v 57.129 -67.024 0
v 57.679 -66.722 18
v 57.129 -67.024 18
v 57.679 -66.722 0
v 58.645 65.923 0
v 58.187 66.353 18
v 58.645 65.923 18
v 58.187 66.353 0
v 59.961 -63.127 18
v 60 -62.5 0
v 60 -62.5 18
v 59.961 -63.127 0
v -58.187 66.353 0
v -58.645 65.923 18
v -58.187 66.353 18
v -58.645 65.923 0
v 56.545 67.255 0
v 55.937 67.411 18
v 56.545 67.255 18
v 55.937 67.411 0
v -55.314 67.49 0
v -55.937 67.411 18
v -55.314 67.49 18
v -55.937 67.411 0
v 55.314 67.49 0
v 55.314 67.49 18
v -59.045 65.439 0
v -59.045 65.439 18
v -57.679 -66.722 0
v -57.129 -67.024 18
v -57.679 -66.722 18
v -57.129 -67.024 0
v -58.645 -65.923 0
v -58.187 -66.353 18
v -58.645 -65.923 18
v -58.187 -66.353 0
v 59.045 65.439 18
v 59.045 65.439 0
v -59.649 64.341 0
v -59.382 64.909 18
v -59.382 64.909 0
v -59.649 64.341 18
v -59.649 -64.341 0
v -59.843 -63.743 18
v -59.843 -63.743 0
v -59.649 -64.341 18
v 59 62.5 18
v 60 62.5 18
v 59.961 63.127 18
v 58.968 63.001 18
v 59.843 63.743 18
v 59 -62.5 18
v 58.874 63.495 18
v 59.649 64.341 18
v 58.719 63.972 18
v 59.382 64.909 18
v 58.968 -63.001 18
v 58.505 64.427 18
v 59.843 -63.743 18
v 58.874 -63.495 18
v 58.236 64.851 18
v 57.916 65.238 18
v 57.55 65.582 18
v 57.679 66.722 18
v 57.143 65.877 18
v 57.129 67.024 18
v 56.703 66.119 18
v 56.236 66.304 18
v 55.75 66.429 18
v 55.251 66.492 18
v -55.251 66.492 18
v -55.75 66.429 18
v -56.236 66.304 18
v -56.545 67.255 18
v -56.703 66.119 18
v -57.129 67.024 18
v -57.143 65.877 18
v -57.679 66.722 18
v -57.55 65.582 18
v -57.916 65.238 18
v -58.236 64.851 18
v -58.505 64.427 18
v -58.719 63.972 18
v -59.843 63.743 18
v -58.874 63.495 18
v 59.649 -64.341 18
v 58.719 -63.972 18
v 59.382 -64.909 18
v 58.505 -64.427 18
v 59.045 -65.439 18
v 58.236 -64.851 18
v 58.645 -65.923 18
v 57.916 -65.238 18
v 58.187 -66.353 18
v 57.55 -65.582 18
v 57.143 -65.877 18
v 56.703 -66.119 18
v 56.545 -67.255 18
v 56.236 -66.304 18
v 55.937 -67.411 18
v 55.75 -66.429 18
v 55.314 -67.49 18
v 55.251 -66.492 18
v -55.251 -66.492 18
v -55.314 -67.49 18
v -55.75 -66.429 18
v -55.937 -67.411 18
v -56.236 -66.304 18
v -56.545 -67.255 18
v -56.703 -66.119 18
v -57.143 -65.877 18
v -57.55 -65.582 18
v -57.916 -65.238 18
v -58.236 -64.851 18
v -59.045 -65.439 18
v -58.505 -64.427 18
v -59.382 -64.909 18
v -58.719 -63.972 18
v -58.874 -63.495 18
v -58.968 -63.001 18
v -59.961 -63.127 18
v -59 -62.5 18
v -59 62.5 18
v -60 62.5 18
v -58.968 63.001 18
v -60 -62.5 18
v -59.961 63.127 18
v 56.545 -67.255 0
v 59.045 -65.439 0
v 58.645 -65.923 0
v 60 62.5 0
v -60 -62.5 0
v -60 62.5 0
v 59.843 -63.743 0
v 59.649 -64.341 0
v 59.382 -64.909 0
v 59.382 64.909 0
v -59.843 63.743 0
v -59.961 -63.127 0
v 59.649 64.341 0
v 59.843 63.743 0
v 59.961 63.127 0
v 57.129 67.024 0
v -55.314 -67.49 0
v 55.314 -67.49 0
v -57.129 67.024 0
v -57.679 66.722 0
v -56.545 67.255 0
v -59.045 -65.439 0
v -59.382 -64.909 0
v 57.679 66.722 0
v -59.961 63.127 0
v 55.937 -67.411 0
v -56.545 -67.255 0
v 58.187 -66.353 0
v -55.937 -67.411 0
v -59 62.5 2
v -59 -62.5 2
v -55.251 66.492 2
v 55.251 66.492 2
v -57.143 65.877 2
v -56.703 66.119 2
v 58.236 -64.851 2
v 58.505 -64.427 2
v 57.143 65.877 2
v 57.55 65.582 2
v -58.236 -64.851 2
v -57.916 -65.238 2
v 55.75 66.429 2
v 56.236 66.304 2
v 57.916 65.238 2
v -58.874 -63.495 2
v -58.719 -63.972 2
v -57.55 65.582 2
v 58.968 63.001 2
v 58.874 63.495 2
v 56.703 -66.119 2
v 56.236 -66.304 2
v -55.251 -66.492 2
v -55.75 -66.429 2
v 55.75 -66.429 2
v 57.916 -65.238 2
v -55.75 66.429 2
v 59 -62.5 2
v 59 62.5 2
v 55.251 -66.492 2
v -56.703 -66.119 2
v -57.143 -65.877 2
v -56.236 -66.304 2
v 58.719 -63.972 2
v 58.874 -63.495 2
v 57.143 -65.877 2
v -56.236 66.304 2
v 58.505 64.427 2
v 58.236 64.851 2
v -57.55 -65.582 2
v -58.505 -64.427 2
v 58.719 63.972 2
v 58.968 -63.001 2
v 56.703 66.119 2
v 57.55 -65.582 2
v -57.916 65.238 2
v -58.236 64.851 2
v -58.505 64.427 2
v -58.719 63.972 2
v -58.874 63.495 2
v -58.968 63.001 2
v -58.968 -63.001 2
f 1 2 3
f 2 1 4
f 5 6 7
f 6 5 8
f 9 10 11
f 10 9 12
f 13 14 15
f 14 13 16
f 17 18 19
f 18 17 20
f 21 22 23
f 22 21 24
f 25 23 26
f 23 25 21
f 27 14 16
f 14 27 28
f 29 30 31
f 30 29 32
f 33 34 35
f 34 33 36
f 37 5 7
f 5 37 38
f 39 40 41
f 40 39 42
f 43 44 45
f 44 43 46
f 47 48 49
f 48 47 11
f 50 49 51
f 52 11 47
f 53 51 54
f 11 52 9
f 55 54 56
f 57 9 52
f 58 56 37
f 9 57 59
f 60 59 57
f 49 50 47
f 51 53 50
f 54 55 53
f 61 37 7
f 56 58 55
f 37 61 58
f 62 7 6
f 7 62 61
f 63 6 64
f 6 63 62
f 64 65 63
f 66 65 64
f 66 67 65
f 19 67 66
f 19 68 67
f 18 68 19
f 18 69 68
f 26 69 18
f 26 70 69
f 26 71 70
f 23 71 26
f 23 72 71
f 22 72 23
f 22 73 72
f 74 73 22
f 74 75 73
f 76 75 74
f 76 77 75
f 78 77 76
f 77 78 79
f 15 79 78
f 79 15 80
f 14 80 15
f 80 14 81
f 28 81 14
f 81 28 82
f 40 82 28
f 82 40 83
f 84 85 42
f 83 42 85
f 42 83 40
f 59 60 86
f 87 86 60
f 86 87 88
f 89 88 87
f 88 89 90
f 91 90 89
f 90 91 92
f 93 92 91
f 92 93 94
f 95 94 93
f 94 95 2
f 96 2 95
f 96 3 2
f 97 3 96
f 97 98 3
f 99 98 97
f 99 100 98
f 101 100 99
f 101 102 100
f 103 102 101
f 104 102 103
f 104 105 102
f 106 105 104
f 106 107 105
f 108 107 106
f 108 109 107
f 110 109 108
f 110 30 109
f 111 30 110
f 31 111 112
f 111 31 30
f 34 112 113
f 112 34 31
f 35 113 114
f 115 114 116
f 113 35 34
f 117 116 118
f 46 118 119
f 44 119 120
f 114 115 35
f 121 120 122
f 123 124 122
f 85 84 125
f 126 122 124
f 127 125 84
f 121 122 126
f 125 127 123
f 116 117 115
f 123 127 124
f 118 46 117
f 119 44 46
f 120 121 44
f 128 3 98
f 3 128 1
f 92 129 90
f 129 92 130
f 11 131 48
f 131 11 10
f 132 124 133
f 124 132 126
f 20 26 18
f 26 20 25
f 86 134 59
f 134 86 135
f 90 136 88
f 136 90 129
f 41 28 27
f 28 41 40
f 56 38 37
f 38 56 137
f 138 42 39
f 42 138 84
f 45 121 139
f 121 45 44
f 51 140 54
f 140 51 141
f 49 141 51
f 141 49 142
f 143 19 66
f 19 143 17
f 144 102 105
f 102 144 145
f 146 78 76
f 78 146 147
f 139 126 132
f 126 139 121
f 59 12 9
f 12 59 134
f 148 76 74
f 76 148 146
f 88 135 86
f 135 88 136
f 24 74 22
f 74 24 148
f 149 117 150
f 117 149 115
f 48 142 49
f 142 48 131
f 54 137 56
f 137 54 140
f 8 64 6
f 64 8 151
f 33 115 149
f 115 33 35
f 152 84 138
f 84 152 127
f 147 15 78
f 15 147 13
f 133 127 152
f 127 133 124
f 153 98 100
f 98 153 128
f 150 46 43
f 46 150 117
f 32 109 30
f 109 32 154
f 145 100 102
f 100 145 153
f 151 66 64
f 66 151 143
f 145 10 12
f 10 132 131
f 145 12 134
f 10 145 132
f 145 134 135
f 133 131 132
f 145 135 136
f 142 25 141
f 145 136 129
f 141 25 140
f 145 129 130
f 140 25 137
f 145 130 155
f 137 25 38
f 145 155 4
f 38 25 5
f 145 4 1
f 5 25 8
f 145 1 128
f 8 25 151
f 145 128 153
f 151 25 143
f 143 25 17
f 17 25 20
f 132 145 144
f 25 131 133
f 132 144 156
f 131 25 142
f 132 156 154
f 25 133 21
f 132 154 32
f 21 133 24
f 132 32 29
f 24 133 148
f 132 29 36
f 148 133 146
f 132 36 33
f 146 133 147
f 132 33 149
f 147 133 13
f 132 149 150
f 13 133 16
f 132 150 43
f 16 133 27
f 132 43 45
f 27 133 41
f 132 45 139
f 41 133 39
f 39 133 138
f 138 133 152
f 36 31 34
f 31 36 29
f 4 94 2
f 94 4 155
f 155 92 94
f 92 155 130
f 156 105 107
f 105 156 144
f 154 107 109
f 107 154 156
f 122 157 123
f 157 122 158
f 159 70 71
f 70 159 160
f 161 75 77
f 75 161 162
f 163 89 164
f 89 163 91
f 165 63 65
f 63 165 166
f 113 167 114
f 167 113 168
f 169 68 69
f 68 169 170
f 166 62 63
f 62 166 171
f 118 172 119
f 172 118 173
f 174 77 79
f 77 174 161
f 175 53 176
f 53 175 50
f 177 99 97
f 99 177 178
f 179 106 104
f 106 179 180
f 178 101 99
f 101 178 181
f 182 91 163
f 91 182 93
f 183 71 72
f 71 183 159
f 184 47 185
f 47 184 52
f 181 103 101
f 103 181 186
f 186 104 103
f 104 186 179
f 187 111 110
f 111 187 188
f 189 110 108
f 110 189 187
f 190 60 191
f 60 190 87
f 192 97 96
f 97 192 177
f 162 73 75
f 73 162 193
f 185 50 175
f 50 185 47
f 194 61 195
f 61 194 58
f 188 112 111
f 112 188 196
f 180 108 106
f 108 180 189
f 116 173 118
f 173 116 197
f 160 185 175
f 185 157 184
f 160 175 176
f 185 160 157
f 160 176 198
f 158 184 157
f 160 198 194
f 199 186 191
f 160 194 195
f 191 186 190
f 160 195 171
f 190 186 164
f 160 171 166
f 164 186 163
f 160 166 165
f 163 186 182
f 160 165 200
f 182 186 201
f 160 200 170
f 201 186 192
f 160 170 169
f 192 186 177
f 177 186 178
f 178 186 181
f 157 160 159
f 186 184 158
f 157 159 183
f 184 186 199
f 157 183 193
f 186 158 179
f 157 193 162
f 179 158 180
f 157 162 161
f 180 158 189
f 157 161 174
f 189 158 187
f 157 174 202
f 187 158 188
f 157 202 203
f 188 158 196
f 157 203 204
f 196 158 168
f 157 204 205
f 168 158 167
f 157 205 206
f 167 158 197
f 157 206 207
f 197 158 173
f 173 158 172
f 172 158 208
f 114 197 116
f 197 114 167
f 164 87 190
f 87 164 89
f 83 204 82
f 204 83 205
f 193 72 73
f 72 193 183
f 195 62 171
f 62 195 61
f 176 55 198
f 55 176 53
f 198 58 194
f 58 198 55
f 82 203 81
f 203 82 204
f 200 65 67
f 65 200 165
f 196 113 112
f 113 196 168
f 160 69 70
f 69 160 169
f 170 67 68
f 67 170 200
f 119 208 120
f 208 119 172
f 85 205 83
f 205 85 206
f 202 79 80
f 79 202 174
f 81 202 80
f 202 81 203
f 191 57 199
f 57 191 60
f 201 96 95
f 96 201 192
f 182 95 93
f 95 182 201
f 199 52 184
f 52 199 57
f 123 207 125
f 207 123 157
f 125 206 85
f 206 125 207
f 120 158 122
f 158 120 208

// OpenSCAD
$fn = 50;


difference() {
	union() {
		hull() {
			translate(v = [-55.0000000000, 62.5000000000, 0]) {
				cylinder(h = 18, r = 5);
			}
			translate(v = [55.0000000000, 62.5000000000, 0]) {
				cylinder(h = 18, r = 5);
			}
			translate(v = [-55.0000000000, -62.5000000000, 0]) {
				cylinder(h = 18, r = 5);
			}
			translate(v = [55.0000000000, -62.5000000000, 0]) {
				cylinder(h = 18, r = 5);
			}
		}
	}
	union() {
		translate(v = [0, 0, 2]) {
			hull() {
				translate(v = [-55.0000000000, 62.5000000000, 0]) {
					cylinder(h = 16, r = 4);
				}
				translate(v = [55.0000000000, 62.5000000000, 0]) {
					cylinder(h = 16, r = 4);
				}
				translate(v = [-55.0000000000, -62.5000000000, 0]) {
					cylinder(h = 16, r = 4);
				}
				translate(v = [55.0000000000, -62.5000000000, 0]) {
					cylinder(h = 16, r = 4);
				}
			}
		}
	}
}
